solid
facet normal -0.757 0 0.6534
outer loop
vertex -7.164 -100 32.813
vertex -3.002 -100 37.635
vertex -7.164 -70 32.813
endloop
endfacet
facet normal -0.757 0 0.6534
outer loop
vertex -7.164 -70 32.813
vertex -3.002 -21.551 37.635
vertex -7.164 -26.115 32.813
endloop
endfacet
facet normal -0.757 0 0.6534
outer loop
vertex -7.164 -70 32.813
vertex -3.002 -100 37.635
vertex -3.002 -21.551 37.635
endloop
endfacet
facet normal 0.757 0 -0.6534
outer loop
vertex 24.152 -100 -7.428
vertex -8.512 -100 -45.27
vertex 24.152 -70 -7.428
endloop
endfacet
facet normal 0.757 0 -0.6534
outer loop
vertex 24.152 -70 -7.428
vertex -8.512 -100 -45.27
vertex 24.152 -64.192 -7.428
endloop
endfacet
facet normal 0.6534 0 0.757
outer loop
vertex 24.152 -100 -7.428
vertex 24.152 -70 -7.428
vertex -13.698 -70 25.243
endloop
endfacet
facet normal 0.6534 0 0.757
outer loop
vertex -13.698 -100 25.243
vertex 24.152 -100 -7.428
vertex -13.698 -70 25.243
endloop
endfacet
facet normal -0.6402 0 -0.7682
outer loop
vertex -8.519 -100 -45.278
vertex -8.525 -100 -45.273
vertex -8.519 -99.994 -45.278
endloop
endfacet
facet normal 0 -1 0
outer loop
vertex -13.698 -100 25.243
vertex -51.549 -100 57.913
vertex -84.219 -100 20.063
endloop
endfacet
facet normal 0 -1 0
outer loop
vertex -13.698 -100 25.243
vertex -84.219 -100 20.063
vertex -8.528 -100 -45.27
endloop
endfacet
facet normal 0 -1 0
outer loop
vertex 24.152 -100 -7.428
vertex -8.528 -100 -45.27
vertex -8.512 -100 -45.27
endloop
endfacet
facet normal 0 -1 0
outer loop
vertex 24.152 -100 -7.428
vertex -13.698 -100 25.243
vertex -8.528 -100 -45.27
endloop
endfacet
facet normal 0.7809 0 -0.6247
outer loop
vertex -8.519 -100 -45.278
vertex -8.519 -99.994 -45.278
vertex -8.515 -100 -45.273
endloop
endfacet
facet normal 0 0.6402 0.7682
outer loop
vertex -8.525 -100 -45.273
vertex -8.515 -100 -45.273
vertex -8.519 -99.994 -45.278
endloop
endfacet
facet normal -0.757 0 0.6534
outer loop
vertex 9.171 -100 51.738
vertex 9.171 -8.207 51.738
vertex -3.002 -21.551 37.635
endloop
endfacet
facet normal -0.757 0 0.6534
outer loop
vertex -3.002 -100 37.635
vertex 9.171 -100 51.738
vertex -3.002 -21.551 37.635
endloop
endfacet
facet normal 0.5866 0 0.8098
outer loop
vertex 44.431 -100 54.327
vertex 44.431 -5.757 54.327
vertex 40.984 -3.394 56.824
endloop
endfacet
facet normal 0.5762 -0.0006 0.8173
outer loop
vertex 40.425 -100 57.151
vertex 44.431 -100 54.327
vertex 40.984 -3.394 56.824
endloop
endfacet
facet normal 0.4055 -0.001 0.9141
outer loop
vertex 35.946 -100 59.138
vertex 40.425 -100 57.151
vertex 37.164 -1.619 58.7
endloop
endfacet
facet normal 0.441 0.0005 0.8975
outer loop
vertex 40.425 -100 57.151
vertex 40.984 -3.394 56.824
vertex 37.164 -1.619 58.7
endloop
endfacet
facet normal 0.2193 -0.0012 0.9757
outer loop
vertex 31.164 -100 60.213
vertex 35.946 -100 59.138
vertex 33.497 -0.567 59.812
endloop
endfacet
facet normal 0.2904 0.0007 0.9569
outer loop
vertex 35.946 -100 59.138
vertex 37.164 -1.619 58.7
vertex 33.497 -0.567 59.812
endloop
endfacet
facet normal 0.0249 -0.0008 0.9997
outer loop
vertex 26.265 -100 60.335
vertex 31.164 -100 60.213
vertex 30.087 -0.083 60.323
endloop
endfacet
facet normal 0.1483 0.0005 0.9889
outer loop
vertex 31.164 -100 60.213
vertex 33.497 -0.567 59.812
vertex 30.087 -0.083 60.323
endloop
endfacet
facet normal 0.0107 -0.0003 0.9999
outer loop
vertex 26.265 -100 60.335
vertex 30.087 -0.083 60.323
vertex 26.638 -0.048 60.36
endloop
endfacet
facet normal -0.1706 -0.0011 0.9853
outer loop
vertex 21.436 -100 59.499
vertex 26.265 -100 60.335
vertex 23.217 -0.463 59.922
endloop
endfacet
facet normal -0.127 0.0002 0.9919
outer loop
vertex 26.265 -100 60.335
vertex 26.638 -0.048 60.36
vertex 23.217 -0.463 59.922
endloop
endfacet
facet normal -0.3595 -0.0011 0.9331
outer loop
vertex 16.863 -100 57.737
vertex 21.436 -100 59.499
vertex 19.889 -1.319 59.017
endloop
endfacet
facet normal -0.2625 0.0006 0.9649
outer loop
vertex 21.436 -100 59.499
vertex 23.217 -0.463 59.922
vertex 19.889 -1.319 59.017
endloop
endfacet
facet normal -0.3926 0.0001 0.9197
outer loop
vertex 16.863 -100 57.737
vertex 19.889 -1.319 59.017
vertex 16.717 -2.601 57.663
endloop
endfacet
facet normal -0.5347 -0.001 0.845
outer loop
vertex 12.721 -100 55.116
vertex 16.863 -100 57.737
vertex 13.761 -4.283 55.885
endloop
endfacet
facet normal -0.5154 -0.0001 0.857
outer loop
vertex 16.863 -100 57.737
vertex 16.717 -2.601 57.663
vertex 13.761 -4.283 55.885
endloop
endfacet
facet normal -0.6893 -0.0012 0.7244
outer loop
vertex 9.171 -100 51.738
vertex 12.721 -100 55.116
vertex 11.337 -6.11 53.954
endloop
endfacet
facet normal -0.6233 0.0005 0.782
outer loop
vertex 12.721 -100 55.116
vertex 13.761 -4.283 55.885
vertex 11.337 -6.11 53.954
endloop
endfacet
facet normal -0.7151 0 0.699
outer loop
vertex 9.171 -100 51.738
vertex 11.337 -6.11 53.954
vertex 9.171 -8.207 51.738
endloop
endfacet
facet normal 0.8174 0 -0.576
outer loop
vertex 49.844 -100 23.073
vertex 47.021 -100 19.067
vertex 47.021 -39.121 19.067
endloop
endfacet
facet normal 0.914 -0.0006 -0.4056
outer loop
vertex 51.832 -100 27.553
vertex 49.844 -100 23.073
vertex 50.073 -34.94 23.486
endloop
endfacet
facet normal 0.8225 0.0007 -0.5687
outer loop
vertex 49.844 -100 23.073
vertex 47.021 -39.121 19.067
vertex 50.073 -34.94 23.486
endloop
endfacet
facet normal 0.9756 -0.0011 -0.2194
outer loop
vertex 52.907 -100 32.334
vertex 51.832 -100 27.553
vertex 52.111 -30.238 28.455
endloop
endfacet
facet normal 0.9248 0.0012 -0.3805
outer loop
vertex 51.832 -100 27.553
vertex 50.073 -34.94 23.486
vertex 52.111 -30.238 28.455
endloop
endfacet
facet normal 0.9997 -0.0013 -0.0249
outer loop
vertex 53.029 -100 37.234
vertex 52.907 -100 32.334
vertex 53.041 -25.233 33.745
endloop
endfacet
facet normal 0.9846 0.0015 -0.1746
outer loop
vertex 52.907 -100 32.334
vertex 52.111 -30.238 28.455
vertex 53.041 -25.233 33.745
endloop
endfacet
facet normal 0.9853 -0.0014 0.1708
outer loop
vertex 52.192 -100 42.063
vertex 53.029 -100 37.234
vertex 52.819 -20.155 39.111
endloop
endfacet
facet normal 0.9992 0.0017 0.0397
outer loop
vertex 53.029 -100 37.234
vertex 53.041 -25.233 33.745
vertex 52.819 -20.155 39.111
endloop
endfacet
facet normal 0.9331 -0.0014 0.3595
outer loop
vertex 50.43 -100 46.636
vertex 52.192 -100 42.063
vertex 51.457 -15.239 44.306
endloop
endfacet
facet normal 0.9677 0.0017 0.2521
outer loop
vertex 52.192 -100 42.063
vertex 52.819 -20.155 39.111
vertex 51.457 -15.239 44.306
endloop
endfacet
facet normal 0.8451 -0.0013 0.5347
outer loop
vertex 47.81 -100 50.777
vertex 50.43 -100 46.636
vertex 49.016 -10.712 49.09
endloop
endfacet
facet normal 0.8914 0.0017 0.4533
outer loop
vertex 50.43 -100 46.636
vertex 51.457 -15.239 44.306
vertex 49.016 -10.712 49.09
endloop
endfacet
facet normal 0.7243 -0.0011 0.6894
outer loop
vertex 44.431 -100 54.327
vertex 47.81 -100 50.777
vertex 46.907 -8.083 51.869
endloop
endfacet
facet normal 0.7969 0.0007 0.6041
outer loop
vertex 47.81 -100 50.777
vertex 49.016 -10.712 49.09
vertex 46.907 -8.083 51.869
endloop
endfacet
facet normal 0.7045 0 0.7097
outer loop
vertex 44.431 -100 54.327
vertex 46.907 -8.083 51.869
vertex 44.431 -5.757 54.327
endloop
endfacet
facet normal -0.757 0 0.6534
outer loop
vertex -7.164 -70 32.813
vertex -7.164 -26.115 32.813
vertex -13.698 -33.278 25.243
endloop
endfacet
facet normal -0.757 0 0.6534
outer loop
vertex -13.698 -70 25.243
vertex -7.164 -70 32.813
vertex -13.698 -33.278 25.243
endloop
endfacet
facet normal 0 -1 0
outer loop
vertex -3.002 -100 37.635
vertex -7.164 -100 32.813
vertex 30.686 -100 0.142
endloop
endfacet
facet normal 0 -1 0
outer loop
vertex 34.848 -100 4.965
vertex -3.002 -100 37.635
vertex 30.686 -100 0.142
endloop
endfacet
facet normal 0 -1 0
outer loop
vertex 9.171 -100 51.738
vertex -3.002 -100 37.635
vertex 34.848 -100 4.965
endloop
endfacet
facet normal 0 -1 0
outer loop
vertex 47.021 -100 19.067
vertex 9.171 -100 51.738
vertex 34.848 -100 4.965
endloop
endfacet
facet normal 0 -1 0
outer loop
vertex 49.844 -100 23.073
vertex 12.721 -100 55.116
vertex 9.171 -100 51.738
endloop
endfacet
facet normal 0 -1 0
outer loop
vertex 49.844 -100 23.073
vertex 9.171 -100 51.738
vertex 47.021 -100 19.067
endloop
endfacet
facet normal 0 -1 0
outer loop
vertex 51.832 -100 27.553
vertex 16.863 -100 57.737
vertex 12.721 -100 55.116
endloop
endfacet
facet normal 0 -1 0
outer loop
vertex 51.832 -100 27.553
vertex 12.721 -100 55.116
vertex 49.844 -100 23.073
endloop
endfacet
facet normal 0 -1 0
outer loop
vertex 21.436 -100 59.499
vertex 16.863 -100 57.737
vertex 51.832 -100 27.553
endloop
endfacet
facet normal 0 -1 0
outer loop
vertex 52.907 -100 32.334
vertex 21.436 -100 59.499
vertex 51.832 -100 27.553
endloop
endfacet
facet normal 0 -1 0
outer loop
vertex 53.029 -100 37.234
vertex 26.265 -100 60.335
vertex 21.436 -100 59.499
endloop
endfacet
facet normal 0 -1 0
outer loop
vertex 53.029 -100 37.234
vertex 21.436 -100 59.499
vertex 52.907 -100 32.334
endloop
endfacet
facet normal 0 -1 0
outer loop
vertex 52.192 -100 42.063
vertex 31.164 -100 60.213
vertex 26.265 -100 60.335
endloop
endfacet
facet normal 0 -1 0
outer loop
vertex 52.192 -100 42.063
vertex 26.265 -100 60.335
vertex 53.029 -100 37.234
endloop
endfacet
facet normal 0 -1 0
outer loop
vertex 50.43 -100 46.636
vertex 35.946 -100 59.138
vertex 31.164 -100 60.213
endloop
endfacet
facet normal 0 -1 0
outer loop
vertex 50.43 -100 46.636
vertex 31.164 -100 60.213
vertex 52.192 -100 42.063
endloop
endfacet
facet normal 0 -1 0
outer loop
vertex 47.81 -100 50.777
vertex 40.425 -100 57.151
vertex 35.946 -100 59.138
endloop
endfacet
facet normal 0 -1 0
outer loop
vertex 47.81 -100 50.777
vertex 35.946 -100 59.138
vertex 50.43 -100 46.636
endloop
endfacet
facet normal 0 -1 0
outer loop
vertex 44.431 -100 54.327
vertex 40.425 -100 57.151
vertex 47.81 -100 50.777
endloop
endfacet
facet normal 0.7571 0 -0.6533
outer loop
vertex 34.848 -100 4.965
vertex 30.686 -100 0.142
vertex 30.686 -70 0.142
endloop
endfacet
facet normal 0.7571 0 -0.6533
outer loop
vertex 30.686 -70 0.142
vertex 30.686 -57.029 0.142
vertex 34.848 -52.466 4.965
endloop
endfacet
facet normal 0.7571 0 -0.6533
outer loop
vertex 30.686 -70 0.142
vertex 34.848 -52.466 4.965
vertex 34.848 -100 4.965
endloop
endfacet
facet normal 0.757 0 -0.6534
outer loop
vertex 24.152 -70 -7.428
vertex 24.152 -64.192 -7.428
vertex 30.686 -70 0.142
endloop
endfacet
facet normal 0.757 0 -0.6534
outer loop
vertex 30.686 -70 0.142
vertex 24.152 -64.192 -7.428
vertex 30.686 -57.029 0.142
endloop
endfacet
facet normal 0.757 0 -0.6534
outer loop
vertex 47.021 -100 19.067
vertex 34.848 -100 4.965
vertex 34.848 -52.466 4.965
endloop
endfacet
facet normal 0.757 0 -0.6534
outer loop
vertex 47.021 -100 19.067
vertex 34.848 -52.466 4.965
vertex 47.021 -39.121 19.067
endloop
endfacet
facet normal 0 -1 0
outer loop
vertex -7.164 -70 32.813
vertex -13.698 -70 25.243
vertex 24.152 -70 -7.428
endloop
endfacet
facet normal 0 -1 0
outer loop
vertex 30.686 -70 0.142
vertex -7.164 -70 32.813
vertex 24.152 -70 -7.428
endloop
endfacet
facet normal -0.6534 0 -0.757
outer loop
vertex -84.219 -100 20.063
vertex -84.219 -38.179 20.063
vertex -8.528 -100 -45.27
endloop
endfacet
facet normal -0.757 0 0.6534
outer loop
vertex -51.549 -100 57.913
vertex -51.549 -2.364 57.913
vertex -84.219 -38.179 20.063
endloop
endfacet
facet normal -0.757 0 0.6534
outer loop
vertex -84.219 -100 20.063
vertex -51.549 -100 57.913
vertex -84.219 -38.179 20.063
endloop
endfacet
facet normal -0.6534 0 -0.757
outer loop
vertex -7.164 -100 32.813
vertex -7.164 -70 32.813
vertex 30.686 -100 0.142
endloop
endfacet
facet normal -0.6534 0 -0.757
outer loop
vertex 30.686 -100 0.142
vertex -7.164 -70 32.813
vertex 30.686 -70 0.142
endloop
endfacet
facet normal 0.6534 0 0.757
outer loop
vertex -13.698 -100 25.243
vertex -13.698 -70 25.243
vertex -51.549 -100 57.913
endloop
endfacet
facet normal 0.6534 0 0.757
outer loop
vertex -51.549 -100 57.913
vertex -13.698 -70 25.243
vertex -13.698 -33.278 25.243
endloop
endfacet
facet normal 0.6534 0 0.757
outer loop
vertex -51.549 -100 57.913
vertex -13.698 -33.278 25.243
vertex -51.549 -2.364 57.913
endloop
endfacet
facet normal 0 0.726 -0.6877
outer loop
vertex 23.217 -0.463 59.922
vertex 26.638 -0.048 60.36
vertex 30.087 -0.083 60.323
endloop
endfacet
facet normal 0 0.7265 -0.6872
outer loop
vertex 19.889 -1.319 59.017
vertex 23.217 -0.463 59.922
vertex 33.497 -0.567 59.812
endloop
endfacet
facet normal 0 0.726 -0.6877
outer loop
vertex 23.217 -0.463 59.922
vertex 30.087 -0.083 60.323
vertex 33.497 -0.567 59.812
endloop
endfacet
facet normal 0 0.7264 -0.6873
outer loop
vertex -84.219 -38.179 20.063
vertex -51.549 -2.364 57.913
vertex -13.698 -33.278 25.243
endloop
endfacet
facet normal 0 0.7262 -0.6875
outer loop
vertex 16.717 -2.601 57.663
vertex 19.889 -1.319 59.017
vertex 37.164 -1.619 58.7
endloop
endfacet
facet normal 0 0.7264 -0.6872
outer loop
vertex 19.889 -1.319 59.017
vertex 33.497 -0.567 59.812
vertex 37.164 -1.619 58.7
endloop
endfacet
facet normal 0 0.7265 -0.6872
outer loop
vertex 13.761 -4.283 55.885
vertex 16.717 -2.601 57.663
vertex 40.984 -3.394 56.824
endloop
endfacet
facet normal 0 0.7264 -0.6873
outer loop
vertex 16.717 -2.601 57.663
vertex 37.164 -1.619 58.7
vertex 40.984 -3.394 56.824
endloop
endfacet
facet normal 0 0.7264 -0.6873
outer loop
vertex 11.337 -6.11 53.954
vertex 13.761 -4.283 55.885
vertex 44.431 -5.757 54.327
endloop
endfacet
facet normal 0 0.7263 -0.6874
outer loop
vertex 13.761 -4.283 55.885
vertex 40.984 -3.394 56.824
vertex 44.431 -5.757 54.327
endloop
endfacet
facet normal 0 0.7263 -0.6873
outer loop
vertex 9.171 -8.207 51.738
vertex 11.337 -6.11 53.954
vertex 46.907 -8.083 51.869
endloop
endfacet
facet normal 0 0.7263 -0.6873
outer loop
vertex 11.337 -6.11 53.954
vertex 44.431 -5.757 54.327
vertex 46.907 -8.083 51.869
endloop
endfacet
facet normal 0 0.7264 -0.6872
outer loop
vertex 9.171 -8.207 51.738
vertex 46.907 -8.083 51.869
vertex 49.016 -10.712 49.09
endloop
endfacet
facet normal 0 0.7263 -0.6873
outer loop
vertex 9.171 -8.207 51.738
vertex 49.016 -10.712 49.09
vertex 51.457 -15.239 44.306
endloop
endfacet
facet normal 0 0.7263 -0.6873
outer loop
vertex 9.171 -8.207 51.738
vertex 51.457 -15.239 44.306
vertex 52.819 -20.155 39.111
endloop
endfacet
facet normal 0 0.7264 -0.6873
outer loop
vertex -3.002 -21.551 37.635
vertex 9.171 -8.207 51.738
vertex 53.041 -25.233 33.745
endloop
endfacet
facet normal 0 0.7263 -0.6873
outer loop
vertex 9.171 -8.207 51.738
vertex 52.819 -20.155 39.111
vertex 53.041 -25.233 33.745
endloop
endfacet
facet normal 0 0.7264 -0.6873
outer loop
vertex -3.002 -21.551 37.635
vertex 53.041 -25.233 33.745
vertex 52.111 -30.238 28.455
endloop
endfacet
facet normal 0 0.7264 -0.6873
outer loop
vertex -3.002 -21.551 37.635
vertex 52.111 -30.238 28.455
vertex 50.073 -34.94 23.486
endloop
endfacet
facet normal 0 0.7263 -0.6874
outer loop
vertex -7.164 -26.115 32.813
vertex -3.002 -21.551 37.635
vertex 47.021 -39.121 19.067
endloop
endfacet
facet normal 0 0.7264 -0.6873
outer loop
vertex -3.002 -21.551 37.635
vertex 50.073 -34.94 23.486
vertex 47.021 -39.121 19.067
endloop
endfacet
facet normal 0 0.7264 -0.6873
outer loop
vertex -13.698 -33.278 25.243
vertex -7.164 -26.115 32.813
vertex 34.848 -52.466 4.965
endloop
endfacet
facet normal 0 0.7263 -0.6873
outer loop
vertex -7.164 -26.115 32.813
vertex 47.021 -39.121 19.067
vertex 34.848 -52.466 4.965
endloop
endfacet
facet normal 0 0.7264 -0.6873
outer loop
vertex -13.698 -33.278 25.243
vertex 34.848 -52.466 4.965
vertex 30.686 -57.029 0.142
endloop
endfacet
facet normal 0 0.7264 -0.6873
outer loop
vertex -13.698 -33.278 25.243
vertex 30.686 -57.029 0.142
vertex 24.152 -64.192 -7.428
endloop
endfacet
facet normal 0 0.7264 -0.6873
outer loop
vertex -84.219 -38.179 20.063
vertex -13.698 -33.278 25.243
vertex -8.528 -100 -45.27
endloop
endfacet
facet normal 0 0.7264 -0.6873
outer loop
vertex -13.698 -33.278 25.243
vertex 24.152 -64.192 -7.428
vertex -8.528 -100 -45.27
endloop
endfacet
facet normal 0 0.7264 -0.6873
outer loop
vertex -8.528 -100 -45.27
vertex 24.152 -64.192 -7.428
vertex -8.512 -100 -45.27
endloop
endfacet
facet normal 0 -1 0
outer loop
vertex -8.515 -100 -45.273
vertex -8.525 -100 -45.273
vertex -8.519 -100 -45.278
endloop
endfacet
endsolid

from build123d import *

# Parameters (mm, degrees)
F2_DEPTH = 70
F3_DEPTH = 100
F4_DEPTH = 100


with BuildPart() as f2:
    # F0 (on Front) → F2 (new body)
    with BuildSketch(Plane.XZ):
        Polygon((-13.698499, 25.242625), (24.15161, -7.427993), (30.685734, 0.142029), (-7.164375, 32.812647), align=None)
    extrude(amount=F2_DEPTH)

    # F0 (on Front) → F3 (join)
    with BuildSketch(Plane.XZ):
        Polygon((-84.219225, 20.063134), (-8.519008, -45.278101), (24.15161, -7.427993), (-13.698499, 25.242625), (-51.548607, 57.913243), align=None)
        with BuildLine():
            Line((-3.001609, 37.635364), (34.8485, 4.964746))
            Line((34.8485, 4.964746), (47.021043, 19.067084))
            ThreePointArc((47.021043, 19.067084), (53.02883, 37.233619), (44.431297, 54.327447))
            ThreePointArc((44.431297, 54.327447), (26.264762, 60.335234), (9.170934, 51.737701))
            Line((9.170934, 51.737701), (-3.001609, 37.635364))
        make_face()
        Polygon((-7.164375, 32.812647), (30.685734, 0.142029), (34.8485, 4.964746), (-3.001609, 37.635364), align=None)
    extrude(amount=F3_DEPTH)

    # F1 (on Right) → F4 (cut, symmetric)
    with BuildSketch(Plane.YZ):
        Polygon((0, 60.411047), (-100.00176, -45.271806), (-18.930101, -113.777013), (76.973737, -12.424885), align=None)
    extrude(amount=F4_DEPTH, both=True, mode=Mode.SUBTRACT)


solid = f2.part
